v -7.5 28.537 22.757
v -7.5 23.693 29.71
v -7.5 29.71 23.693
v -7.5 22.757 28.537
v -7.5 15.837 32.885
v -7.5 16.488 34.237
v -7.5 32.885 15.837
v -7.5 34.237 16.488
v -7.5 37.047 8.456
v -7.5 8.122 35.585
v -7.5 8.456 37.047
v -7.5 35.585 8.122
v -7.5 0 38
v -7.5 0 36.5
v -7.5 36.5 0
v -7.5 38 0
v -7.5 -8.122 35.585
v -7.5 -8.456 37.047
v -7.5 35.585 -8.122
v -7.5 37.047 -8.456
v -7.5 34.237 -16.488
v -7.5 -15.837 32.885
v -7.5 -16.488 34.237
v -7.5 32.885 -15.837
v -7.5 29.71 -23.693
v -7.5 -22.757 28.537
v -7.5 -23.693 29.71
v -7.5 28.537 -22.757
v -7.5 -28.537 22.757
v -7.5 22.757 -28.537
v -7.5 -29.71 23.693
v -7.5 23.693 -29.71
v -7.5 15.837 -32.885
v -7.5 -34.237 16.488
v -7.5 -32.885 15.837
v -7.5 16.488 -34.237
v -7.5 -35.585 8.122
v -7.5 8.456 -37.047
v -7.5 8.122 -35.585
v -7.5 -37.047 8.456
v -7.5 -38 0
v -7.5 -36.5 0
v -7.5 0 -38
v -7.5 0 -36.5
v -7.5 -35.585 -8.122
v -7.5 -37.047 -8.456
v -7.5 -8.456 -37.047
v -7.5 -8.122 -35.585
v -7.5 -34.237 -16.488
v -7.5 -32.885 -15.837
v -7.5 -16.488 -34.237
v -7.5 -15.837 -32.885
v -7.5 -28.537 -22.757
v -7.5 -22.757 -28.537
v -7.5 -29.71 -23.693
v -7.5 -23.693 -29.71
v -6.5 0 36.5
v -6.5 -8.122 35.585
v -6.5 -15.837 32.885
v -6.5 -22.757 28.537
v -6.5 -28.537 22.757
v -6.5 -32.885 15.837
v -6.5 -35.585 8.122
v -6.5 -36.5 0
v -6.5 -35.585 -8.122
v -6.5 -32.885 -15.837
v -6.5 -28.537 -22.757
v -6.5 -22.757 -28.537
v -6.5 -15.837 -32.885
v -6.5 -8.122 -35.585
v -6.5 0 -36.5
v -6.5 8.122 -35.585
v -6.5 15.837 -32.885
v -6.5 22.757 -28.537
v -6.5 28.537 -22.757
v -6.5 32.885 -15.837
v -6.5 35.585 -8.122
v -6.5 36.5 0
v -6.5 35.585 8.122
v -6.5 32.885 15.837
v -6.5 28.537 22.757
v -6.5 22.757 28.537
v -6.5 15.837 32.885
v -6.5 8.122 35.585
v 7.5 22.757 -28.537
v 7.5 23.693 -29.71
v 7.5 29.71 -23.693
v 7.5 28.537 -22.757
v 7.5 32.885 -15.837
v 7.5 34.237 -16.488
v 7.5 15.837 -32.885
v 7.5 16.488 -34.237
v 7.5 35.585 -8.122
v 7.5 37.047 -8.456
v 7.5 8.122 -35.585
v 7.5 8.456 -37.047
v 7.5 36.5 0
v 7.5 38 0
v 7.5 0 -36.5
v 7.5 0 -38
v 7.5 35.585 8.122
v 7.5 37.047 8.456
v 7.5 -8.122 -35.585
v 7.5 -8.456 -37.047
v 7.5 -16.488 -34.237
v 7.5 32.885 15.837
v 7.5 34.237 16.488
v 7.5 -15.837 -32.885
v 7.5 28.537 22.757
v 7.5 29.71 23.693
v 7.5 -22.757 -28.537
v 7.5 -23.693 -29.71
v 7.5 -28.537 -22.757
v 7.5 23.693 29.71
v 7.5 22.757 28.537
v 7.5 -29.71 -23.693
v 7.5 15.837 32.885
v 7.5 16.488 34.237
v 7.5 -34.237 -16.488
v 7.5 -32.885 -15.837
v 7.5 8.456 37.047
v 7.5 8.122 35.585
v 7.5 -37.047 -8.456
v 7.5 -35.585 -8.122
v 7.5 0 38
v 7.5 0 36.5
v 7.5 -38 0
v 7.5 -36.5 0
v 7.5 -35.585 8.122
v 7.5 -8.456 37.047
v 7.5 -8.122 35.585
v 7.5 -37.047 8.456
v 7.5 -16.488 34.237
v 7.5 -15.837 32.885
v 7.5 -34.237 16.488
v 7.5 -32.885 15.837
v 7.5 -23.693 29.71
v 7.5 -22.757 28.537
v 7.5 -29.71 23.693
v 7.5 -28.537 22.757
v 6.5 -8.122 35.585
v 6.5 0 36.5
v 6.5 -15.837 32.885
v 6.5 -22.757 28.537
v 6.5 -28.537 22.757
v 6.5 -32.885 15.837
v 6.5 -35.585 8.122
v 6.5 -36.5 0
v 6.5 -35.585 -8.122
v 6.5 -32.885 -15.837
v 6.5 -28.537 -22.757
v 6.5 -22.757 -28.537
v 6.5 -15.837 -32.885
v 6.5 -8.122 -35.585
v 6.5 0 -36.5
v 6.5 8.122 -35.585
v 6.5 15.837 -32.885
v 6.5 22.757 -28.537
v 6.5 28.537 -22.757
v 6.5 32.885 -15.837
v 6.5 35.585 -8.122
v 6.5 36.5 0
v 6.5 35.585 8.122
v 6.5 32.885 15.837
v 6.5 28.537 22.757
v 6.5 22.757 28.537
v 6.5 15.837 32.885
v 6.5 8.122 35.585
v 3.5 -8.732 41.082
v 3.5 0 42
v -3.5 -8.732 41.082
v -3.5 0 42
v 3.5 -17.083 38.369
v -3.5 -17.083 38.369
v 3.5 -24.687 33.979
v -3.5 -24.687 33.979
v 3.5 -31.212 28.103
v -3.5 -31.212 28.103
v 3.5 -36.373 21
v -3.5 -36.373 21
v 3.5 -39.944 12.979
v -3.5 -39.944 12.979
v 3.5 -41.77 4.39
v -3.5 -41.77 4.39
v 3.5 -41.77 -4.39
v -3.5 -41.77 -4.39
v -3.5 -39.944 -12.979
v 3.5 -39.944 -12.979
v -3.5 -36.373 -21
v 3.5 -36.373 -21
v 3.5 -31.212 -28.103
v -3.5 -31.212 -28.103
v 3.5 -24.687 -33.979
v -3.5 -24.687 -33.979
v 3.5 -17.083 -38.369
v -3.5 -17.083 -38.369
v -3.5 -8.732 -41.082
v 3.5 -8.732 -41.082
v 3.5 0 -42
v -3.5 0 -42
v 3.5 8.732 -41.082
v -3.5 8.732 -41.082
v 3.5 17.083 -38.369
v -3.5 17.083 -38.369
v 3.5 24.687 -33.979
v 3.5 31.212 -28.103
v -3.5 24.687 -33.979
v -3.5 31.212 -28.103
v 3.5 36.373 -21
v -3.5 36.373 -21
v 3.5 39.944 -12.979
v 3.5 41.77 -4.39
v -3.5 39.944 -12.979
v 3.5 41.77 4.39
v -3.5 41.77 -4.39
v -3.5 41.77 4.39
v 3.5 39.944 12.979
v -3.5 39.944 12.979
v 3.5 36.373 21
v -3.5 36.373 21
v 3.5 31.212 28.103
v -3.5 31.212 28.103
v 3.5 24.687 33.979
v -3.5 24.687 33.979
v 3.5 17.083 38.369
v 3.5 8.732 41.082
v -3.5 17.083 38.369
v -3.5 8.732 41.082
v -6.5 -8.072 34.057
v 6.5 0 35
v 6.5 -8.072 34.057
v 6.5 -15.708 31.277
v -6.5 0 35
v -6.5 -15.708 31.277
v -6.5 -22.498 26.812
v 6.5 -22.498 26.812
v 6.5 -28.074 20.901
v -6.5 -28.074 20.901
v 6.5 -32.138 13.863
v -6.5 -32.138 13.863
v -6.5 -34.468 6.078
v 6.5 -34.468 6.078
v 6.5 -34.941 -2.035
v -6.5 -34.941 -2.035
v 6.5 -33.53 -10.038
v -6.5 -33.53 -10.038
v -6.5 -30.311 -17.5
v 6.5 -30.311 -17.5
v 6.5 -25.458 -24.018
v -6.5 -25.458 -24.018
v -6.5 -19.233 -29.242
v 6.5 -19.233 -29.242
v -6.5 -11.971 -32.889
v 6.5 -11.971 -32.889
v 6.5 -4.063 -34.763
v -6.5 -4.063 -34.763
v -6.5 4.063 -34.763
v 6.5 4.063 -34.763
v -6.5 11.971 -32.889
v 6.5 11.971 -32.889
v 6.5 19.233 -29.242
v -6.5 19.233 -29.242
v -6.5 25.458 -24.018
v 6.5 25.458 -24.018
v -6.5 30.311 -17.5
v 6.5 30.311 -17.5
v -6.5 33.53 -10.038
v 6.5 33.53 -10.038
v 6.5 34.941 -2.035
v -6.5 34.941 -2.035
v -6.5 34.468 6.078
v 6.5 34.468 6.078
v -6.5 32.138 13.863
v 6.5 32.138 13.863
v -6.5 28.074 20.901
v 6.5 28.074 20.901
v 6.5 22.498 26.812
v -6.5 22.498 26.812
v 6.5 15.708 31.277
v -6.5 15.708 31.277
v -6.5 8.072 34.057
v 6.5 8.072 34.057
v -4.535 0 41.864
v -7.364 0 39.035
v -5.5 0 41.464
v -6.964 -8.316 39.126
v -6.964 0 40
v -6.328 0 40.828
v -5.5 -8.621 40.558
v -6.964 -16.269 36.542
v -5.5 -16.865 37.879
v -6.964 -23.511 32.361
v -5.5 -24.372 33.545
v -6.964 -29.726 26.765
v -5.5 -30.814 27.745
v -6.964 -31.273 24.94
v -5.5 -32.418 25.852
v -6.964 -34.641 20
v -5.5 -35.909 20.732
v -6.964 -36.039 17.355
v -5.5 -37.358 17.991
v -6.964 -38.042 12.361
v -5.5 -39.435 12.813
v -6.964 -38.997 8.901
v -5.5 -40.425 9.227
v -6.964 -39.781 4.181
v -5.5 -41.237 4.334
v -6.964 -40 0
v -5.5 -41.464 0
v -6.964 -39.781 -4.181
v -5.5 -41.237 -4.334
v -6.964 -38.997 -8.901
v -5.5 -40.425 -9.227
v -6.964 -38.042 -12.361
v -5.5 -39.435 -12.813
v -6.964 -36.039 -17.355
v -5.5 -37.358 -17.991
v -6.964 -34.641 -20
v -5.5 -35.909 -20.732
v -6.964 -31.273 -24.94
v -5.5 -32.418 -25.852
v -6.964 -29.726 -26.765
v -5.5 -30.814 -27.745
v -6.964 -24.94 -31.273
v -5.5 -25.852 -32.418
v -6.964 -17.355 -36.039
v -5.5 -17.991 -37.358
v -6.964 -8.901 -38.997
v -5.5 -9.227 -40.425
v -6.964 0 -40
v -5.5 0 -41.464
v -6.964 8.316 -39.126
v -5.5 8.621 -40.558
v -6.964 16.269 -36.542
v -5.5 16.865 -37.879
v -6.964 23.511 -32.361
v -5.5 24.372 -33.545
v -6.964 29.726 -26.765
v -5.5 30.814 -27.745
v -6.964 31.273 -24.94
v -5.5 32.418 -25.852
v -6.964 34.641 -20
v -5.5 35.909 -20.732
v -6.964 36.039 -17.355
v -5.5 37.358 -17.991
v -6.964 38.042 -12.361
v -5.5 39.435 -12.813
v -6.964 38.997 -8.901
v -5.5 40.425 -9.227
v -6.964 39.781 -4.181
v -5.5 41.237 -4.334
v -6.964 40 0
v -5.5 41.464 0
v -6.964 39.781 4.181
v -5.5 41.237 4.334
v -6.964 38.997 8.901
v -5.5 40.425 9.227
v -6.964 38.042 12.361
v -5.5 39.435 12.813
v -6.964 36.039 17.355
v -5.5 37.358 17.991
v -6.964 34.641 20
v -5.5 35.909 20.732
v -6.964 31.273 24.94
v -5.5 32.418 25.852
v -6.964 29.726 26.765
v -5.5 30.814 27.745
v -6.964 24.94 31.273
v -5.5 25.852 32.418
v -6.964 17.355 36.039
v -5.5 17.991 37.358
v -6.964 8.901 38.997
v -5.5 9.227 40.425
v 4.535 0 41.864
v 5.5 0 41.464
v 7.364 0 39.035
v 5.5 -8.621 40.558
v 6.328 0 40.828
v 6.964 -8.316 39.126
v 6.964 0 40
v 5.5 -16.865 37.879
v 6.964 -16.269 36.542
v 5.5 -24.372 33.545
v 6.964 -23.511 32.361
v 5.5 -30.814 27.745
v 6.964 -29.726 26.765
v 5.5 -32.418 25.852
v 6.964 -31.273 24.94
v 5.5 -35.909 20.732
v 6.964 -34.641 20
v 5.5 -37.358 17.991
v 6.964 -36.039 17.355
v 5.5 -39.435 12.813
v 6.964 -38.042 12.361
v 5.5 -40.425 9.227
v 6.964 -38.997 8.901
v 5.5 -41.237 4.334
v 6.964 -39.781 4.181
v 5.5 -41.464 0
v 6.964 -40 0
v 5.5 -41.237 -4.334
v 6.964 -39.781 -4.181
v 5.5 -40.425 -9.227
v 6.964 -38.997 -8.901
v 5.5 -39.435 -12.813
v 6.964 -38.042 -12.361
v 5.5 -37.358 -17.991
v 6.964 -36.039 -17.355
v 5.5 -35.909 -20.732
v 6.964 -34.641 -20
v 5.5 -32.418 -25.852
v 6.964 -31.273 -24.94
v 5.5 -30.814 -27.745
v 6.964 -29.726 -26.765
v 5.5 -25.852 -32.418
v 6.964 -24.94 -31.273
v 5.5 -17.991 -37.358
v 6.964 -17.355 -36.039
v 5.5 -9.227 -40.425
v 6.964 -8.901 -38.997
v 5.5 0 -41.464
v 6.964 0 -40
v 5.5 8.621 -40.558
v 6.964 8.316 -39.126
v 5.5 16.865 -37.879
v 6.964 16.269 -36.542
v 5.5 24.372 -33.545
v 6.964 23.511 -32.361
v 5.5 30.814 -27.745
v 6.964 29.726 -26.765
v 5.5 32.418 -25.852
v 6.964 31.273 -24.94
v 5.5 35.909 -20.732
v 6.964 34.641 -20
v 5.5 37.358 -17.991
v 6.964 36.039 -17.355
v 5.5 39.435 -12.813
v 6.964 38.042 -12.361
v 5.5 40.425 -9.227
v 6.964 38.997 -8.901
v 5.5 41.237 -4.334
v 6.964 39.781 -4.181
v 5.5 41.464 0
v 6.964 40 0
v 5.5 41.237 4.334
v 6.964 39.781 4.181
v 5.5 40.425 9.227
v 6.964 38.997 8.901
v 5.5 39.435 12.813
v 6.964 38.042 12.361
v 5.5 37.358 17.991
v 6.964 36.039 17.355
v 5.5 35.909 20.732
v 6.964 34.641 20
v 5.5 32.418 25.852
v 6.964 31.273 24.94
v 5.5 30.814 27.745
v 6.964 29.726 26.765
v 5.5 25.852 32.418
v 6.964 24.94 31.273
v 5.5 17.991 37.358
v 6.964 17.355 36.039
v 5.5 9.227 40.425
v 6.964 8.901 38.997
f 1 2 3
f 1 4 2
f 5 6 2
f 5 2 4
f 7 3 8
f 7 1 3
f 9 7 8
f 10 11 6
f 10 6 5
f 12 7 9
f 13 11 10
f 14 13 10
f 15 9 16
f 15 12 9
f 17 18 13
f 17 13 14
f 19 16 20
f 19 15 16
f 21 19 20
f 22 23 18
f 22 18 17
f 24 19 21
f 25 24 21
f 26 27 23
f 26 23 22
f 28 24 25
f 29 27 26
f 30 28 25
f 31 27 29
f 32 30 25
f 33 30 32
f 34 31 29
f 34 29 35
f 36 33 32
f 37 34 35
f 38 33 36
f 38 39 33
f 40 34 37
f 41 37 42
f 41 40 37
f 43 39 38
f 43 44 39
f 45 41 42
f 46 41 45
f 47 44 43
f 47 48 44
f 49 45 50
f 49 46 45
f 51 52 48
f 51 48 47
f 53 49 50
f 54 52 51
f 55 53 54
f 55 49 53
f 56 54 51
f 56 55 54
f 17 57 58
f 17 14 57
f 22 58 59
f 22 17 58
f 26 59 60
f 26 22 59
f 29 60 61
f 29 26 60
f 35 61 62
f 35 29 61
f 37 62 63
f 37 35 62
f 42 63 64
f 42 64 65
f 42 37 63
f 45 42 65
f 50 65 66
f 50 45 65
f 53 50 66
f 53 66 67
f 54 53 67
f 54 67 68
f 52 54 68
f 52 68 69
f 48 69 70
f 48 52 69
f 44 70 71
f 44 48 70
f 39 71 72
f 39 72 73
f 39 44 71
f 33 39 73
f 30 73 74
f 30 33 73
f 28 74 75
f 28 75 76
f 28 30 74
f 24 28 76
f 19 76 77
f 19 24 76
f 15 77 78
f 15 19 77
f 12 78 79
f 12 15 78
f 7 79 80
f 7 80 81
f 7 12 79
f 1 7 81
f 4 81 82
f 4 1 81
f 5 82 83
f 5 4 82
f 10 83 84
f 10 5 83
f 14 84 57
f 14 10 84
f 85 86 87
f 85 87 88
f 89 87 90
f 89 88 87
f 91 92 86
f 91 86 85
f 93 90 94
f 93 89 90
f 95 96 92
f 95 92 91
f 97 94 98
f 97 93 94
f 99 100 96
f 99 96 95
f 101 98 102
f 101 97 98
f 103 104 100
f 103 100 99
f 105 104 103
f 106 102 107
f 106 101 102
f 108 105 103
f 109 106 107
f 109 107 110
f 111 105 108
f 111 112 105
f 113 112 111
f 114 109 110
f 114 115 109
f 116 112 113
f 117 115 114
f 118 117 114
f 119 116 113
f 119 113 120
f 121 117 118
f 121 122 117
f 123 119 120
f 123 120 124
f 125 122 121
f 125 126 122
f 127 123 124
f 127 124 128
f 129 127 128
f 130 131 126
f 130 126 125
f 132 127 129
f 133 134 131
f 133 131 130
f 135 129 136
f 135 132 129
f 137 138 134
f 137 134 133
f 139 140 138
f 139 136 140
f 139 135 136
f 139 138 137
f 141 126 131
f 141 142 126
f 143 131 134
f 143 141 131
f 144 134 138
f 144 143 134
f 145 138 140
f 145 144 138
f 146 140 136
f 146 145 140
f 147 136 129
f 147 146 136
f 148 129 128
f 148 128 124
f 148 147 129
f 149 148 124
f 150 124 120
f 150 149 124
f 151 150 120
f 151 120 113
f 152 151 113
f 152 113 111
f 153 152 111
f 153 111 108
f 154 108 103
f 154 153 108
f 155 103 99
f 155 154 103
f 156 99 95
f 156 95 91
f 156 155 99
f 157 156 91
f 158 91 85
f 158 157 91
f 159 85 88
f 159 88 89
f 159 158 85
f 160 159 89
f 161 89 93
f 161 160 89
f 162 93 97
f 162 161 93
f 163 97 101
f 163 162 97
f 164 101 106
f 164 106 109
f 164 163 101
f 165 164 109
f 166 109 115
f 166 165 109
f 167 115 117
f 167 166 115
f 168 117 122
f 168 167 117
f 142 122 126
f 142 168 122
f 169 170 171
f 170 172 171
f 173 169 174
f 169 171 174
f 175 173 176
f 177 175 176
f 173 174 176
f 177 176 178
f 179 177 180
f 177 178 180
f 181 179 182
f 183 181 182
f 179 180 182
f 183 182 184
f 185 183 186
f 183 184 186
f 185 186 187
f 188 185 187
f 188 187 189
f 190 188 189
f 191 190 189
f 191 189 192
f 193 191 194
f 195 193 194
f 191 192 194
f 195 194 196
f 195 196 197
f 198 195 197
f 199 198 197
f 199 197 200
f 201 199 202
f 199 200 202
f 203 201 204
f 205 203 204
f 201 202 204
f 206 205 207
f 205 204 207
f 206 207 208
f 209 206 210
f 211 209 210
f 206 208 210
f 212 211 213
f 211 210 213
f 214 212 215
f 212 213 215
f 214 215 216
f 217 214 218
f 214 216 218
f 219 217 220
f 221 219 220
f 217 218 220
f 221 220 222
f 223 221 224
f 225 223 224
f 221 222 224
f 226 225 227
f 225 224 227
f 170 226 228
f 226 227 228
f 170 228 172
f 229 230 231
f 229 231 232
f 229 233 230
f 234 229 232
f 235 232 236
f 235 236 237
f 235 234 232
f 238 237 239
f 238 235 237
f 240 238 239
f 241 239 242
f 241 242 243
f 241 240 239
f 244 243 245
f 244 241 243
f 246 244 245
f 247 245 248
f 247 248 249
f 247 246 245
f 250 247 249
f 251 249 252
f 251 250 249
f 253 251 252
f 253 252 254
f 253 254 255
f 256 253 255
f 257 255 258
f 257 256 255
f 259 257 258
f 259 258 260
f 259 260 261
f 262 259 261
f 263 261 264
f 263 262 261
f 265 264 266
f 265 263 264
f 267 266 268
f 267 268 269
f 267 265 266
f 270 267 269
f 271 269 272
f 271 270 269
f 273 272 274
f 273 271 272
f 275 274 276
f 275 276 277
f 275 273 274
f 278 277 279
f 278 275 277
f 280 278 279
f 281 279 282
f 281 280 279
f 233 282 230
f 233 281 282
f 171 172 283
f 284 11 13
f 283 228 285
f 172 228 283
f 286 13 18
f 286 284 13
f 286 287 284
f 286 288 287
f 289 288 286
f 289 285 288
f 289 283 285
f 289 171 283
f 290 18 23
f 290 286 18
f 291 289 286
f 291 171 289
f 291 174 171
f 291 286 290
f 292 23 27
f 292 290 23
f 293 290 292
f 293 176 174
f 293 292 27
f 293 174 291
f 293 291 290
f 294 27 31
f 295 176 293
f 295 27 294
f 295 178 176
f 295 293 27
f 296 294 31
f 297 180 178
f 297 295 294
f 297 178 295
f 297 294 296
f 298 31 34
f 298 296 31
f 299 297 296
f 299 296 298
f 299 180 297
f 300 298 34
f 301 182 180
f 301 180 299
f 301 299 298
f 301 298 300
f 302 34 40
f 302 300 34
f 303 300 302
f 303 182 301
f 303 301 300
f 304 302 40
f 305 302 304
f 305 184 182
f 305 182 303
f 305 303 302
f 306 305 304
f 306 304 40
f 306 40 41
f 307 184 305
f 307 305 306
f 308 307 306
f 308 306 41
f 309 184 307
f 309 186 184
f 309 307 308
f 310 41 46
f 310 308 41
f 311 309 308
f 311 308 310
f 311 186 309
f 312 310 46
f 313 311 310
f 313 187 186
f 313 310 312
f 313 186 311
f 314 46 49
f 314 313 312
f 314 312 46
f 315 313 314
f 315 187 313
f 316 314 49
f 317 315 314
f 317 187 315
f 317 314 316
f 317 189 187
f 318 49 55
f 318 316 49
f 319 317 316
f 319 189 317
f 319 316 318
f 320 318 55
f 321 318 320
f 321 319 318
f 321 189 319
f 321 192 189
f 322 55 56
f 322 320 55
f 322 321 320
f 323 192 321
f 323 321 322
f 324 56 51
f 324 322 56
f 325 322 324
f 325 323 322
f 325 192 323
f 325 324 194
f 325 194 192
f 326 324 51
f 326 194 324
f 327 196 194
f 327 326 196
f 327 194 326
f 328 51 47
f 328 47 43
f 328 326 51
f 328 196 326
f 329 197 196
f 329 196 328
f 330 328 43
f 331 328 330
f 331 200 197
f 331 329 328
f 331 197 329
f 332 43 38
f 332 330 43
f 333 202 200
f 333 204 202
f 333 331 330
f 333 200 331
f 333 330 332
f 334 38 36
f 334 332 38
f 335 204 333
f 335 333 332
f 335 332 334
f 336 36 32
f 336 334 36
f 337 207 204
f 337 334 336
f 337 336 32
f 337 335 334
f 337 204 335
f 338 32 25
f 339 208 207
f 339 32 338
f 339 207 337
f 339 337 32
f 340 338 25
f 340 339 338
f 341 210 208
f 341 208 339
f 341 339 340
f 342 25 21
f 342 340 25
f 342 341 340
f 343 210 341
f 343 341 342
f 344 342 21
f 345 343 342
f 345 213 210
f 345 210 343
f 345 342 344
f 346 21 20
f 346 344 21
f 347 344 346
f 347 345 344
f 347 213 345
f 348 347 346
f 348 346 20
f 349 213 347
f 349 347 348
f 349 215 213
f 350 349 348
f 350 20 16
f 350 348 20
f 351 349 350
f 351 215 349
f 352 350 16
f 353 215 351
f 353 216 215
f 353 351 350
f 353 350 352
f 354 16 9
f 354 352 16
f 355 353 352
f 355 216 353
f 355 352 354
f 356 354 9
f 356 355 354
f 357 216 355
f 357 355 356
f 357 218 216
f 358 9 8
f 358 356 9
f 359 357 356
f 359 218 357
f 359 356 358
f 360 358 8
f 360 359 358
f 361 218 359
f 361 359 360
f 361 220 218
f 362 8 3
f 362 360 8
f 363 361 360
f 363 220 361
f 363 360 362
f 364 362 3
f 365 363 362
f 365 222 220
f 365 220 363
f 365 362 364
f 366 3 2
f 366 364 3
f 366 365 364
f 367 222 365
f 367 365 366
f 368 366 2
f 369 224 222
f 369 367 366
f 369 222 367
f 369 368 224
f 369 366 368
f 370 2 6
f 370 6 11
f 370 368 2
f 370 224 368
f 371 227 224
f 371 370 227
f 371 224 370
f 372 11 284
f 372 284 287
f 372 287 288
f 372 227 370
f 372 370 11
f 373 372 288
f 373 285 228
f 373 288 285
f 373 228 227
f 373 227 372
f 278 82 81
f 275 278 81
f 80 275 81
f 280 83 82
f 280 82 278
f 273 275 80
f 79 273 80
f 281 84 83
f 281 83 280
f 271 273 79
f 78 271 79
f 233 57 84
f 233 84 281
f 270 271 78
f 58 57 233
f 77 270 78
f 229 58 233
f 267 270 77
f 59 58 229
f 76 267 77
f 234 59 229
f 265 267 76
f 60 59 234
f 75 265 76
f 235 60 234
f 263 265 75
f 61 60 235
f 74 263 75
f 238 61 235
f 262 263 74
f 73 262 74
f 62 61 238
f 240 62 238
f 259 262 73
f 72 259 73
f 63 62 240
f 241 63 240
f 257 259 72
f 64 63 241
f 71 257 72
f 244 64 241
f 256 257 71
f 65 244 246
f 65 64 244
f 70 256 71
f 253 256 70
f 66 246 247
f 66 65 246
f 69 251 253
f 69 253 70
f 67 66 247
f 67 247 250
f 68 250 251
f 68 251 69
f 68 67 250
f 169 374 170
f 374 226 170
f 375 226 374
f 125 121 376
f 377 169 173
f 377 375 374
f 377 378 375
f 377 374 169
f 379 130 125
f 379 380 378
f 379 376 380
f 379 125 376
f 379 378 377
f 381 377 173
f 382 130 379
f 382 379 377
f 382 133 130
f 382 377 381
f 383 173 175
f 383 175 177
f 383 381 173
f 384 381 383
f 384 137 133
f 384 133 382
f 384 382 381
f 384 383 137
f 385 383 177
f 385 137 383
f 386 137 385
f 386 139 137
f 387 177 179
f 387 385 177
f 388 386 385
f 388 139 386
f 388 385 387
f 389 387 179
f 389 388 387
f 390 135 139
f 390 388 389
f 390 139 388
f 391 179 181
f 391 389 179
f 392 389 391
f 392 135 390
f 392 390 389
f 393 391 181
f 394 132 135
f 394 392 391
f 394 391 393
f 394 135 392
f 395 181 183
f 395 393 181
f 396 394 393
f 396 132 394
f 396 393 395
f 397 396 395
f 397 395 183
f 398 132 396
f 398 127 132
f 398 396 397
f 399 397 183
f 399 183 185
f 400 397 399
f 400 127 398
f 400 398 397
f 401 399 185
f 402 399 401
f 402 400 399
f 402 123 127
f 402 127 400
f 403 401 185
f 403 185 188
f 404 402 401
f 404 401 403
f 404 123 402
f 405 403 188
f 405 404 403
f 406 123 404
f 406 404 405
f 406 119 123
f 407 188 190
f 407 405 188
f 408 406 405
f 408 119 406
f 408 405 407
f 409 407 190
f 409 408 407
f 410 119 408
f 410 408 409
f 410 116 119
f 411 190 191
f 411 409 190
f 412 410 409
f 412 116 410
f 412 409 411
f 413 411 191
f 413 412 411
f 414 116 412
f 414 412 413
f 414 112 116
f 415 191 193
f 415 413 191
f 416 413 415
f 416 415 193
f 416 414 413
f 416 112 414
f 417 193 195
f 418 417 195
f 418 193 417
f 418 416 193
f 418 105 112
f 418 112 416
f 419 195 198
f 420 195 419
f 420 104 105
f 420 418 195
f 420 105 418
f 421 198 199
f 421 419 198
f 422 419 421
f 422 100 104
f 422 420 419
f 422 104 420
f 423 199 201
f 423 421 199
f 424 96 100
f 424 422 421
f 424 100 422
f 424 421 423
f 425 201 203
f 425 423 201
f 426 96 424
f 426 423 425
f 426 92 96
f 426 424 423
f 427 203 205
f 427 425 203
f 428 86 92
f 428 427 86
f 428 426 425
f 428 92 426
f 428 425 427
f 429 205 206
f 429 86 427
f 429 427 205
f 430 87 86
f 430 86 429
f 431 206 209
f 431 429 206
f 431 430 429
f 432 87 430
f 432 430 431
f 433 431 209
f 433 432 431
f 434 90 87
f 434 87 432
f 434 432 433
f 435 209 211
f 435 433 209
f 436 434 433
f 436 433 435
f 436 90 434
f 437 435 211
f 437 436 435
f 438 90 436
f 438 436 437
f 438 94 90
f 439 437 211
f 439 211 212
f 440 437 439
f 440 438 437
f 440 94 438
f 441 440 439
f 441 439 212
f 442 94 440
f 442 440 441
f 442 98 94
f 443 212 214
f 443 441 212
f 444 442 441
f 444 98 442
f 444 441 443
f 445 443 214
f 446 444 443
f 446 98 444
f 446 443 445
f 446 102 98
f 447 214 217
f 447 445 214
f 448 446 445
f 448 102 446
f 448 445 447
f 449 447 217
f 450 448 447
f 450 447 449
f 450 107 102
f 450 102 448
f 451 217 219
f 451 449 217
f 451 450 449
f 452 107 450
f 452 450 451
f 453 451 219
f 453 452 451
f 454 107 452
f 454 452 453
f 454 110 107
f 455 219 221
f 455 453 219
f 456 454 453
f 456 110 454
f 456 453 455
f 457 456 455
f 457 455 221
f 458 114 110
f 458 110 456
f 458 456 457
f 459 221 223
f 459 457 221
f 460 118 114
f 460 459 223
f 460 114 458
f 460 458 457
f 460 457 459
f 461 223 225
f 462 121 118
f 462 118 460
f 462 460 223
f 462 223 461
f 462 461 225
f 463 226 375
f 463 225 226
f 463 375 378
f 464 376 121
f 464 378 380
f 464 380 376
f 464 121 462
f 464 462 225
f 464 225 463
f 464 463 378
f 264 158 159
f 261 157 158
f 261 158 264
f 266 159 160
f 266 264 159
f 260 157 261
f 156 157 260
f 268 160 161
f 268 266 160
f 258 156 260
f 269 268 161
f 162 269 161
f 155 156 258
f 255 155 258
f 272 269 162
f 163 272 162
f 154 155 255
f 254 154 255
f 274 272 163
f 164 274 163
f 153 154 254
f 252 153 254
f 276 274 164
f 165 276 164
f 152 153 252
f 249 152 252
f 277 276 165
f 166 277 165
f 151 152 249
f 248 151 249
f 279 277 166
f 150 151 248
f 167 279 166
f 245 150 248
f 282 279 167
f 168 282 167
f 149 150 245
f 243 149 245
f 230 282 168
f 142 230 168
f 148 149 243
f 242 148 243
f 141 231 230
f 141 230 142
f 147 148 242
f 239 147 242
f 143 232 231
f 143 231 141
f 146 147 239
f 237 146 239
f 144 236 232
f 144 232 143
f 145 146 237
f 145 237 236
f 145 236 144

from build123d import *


with BuildPart() as part:
    # Sketch1 → Revolve1 (revolve)
    with BuildSketch(Plane.XY, mode=Mode.PRIVATE) as revolve1_sk:
        with BuildLine():
            Line((-3.5, 42), (3.5, 42))
            ThreePointArc((3.5, 42), (6.328427125, 40.828427125), (7.5, 38))
            Line((7.5, 38), (7.5, 36.5))
            Line((7.5, 36.5), (6.5, 36.5))
            Line((6.5, 36.5), (6.5, 35))
            Line((6.5, 35), (-6.5, 35))
            Line((-6.5, 35), (-6.5, 36.5))
            Line((-6.5, 36.5), (-7.5, 36.5))
            Line((-7.5, 36.5), (-7.5, 38))
            ThreePointArc((-7.5, 38), (-6.328427125, 40.828427125), (-3.5, 42))
        make_face()
        Polygon((-2.542209765, 42), (-3.292209765, 42), (-3.292209765, 41), (-1.792209765, 41), (-1.792209765, 42), align=None)
        Polygon((3.207790235, 41), (3.207790235, 42), (2.457790235, 42), (1.707790235, 42), (1.707790235, 41), align=None)
    revolve(revolve1_sk.sketch.rotate(Axis((-13.410818461, 0, 0), (1, 0, 0)), 90), axis=Axis((-13.410818461, 0, 0), (1, 0, 0)))


solid = part.part
